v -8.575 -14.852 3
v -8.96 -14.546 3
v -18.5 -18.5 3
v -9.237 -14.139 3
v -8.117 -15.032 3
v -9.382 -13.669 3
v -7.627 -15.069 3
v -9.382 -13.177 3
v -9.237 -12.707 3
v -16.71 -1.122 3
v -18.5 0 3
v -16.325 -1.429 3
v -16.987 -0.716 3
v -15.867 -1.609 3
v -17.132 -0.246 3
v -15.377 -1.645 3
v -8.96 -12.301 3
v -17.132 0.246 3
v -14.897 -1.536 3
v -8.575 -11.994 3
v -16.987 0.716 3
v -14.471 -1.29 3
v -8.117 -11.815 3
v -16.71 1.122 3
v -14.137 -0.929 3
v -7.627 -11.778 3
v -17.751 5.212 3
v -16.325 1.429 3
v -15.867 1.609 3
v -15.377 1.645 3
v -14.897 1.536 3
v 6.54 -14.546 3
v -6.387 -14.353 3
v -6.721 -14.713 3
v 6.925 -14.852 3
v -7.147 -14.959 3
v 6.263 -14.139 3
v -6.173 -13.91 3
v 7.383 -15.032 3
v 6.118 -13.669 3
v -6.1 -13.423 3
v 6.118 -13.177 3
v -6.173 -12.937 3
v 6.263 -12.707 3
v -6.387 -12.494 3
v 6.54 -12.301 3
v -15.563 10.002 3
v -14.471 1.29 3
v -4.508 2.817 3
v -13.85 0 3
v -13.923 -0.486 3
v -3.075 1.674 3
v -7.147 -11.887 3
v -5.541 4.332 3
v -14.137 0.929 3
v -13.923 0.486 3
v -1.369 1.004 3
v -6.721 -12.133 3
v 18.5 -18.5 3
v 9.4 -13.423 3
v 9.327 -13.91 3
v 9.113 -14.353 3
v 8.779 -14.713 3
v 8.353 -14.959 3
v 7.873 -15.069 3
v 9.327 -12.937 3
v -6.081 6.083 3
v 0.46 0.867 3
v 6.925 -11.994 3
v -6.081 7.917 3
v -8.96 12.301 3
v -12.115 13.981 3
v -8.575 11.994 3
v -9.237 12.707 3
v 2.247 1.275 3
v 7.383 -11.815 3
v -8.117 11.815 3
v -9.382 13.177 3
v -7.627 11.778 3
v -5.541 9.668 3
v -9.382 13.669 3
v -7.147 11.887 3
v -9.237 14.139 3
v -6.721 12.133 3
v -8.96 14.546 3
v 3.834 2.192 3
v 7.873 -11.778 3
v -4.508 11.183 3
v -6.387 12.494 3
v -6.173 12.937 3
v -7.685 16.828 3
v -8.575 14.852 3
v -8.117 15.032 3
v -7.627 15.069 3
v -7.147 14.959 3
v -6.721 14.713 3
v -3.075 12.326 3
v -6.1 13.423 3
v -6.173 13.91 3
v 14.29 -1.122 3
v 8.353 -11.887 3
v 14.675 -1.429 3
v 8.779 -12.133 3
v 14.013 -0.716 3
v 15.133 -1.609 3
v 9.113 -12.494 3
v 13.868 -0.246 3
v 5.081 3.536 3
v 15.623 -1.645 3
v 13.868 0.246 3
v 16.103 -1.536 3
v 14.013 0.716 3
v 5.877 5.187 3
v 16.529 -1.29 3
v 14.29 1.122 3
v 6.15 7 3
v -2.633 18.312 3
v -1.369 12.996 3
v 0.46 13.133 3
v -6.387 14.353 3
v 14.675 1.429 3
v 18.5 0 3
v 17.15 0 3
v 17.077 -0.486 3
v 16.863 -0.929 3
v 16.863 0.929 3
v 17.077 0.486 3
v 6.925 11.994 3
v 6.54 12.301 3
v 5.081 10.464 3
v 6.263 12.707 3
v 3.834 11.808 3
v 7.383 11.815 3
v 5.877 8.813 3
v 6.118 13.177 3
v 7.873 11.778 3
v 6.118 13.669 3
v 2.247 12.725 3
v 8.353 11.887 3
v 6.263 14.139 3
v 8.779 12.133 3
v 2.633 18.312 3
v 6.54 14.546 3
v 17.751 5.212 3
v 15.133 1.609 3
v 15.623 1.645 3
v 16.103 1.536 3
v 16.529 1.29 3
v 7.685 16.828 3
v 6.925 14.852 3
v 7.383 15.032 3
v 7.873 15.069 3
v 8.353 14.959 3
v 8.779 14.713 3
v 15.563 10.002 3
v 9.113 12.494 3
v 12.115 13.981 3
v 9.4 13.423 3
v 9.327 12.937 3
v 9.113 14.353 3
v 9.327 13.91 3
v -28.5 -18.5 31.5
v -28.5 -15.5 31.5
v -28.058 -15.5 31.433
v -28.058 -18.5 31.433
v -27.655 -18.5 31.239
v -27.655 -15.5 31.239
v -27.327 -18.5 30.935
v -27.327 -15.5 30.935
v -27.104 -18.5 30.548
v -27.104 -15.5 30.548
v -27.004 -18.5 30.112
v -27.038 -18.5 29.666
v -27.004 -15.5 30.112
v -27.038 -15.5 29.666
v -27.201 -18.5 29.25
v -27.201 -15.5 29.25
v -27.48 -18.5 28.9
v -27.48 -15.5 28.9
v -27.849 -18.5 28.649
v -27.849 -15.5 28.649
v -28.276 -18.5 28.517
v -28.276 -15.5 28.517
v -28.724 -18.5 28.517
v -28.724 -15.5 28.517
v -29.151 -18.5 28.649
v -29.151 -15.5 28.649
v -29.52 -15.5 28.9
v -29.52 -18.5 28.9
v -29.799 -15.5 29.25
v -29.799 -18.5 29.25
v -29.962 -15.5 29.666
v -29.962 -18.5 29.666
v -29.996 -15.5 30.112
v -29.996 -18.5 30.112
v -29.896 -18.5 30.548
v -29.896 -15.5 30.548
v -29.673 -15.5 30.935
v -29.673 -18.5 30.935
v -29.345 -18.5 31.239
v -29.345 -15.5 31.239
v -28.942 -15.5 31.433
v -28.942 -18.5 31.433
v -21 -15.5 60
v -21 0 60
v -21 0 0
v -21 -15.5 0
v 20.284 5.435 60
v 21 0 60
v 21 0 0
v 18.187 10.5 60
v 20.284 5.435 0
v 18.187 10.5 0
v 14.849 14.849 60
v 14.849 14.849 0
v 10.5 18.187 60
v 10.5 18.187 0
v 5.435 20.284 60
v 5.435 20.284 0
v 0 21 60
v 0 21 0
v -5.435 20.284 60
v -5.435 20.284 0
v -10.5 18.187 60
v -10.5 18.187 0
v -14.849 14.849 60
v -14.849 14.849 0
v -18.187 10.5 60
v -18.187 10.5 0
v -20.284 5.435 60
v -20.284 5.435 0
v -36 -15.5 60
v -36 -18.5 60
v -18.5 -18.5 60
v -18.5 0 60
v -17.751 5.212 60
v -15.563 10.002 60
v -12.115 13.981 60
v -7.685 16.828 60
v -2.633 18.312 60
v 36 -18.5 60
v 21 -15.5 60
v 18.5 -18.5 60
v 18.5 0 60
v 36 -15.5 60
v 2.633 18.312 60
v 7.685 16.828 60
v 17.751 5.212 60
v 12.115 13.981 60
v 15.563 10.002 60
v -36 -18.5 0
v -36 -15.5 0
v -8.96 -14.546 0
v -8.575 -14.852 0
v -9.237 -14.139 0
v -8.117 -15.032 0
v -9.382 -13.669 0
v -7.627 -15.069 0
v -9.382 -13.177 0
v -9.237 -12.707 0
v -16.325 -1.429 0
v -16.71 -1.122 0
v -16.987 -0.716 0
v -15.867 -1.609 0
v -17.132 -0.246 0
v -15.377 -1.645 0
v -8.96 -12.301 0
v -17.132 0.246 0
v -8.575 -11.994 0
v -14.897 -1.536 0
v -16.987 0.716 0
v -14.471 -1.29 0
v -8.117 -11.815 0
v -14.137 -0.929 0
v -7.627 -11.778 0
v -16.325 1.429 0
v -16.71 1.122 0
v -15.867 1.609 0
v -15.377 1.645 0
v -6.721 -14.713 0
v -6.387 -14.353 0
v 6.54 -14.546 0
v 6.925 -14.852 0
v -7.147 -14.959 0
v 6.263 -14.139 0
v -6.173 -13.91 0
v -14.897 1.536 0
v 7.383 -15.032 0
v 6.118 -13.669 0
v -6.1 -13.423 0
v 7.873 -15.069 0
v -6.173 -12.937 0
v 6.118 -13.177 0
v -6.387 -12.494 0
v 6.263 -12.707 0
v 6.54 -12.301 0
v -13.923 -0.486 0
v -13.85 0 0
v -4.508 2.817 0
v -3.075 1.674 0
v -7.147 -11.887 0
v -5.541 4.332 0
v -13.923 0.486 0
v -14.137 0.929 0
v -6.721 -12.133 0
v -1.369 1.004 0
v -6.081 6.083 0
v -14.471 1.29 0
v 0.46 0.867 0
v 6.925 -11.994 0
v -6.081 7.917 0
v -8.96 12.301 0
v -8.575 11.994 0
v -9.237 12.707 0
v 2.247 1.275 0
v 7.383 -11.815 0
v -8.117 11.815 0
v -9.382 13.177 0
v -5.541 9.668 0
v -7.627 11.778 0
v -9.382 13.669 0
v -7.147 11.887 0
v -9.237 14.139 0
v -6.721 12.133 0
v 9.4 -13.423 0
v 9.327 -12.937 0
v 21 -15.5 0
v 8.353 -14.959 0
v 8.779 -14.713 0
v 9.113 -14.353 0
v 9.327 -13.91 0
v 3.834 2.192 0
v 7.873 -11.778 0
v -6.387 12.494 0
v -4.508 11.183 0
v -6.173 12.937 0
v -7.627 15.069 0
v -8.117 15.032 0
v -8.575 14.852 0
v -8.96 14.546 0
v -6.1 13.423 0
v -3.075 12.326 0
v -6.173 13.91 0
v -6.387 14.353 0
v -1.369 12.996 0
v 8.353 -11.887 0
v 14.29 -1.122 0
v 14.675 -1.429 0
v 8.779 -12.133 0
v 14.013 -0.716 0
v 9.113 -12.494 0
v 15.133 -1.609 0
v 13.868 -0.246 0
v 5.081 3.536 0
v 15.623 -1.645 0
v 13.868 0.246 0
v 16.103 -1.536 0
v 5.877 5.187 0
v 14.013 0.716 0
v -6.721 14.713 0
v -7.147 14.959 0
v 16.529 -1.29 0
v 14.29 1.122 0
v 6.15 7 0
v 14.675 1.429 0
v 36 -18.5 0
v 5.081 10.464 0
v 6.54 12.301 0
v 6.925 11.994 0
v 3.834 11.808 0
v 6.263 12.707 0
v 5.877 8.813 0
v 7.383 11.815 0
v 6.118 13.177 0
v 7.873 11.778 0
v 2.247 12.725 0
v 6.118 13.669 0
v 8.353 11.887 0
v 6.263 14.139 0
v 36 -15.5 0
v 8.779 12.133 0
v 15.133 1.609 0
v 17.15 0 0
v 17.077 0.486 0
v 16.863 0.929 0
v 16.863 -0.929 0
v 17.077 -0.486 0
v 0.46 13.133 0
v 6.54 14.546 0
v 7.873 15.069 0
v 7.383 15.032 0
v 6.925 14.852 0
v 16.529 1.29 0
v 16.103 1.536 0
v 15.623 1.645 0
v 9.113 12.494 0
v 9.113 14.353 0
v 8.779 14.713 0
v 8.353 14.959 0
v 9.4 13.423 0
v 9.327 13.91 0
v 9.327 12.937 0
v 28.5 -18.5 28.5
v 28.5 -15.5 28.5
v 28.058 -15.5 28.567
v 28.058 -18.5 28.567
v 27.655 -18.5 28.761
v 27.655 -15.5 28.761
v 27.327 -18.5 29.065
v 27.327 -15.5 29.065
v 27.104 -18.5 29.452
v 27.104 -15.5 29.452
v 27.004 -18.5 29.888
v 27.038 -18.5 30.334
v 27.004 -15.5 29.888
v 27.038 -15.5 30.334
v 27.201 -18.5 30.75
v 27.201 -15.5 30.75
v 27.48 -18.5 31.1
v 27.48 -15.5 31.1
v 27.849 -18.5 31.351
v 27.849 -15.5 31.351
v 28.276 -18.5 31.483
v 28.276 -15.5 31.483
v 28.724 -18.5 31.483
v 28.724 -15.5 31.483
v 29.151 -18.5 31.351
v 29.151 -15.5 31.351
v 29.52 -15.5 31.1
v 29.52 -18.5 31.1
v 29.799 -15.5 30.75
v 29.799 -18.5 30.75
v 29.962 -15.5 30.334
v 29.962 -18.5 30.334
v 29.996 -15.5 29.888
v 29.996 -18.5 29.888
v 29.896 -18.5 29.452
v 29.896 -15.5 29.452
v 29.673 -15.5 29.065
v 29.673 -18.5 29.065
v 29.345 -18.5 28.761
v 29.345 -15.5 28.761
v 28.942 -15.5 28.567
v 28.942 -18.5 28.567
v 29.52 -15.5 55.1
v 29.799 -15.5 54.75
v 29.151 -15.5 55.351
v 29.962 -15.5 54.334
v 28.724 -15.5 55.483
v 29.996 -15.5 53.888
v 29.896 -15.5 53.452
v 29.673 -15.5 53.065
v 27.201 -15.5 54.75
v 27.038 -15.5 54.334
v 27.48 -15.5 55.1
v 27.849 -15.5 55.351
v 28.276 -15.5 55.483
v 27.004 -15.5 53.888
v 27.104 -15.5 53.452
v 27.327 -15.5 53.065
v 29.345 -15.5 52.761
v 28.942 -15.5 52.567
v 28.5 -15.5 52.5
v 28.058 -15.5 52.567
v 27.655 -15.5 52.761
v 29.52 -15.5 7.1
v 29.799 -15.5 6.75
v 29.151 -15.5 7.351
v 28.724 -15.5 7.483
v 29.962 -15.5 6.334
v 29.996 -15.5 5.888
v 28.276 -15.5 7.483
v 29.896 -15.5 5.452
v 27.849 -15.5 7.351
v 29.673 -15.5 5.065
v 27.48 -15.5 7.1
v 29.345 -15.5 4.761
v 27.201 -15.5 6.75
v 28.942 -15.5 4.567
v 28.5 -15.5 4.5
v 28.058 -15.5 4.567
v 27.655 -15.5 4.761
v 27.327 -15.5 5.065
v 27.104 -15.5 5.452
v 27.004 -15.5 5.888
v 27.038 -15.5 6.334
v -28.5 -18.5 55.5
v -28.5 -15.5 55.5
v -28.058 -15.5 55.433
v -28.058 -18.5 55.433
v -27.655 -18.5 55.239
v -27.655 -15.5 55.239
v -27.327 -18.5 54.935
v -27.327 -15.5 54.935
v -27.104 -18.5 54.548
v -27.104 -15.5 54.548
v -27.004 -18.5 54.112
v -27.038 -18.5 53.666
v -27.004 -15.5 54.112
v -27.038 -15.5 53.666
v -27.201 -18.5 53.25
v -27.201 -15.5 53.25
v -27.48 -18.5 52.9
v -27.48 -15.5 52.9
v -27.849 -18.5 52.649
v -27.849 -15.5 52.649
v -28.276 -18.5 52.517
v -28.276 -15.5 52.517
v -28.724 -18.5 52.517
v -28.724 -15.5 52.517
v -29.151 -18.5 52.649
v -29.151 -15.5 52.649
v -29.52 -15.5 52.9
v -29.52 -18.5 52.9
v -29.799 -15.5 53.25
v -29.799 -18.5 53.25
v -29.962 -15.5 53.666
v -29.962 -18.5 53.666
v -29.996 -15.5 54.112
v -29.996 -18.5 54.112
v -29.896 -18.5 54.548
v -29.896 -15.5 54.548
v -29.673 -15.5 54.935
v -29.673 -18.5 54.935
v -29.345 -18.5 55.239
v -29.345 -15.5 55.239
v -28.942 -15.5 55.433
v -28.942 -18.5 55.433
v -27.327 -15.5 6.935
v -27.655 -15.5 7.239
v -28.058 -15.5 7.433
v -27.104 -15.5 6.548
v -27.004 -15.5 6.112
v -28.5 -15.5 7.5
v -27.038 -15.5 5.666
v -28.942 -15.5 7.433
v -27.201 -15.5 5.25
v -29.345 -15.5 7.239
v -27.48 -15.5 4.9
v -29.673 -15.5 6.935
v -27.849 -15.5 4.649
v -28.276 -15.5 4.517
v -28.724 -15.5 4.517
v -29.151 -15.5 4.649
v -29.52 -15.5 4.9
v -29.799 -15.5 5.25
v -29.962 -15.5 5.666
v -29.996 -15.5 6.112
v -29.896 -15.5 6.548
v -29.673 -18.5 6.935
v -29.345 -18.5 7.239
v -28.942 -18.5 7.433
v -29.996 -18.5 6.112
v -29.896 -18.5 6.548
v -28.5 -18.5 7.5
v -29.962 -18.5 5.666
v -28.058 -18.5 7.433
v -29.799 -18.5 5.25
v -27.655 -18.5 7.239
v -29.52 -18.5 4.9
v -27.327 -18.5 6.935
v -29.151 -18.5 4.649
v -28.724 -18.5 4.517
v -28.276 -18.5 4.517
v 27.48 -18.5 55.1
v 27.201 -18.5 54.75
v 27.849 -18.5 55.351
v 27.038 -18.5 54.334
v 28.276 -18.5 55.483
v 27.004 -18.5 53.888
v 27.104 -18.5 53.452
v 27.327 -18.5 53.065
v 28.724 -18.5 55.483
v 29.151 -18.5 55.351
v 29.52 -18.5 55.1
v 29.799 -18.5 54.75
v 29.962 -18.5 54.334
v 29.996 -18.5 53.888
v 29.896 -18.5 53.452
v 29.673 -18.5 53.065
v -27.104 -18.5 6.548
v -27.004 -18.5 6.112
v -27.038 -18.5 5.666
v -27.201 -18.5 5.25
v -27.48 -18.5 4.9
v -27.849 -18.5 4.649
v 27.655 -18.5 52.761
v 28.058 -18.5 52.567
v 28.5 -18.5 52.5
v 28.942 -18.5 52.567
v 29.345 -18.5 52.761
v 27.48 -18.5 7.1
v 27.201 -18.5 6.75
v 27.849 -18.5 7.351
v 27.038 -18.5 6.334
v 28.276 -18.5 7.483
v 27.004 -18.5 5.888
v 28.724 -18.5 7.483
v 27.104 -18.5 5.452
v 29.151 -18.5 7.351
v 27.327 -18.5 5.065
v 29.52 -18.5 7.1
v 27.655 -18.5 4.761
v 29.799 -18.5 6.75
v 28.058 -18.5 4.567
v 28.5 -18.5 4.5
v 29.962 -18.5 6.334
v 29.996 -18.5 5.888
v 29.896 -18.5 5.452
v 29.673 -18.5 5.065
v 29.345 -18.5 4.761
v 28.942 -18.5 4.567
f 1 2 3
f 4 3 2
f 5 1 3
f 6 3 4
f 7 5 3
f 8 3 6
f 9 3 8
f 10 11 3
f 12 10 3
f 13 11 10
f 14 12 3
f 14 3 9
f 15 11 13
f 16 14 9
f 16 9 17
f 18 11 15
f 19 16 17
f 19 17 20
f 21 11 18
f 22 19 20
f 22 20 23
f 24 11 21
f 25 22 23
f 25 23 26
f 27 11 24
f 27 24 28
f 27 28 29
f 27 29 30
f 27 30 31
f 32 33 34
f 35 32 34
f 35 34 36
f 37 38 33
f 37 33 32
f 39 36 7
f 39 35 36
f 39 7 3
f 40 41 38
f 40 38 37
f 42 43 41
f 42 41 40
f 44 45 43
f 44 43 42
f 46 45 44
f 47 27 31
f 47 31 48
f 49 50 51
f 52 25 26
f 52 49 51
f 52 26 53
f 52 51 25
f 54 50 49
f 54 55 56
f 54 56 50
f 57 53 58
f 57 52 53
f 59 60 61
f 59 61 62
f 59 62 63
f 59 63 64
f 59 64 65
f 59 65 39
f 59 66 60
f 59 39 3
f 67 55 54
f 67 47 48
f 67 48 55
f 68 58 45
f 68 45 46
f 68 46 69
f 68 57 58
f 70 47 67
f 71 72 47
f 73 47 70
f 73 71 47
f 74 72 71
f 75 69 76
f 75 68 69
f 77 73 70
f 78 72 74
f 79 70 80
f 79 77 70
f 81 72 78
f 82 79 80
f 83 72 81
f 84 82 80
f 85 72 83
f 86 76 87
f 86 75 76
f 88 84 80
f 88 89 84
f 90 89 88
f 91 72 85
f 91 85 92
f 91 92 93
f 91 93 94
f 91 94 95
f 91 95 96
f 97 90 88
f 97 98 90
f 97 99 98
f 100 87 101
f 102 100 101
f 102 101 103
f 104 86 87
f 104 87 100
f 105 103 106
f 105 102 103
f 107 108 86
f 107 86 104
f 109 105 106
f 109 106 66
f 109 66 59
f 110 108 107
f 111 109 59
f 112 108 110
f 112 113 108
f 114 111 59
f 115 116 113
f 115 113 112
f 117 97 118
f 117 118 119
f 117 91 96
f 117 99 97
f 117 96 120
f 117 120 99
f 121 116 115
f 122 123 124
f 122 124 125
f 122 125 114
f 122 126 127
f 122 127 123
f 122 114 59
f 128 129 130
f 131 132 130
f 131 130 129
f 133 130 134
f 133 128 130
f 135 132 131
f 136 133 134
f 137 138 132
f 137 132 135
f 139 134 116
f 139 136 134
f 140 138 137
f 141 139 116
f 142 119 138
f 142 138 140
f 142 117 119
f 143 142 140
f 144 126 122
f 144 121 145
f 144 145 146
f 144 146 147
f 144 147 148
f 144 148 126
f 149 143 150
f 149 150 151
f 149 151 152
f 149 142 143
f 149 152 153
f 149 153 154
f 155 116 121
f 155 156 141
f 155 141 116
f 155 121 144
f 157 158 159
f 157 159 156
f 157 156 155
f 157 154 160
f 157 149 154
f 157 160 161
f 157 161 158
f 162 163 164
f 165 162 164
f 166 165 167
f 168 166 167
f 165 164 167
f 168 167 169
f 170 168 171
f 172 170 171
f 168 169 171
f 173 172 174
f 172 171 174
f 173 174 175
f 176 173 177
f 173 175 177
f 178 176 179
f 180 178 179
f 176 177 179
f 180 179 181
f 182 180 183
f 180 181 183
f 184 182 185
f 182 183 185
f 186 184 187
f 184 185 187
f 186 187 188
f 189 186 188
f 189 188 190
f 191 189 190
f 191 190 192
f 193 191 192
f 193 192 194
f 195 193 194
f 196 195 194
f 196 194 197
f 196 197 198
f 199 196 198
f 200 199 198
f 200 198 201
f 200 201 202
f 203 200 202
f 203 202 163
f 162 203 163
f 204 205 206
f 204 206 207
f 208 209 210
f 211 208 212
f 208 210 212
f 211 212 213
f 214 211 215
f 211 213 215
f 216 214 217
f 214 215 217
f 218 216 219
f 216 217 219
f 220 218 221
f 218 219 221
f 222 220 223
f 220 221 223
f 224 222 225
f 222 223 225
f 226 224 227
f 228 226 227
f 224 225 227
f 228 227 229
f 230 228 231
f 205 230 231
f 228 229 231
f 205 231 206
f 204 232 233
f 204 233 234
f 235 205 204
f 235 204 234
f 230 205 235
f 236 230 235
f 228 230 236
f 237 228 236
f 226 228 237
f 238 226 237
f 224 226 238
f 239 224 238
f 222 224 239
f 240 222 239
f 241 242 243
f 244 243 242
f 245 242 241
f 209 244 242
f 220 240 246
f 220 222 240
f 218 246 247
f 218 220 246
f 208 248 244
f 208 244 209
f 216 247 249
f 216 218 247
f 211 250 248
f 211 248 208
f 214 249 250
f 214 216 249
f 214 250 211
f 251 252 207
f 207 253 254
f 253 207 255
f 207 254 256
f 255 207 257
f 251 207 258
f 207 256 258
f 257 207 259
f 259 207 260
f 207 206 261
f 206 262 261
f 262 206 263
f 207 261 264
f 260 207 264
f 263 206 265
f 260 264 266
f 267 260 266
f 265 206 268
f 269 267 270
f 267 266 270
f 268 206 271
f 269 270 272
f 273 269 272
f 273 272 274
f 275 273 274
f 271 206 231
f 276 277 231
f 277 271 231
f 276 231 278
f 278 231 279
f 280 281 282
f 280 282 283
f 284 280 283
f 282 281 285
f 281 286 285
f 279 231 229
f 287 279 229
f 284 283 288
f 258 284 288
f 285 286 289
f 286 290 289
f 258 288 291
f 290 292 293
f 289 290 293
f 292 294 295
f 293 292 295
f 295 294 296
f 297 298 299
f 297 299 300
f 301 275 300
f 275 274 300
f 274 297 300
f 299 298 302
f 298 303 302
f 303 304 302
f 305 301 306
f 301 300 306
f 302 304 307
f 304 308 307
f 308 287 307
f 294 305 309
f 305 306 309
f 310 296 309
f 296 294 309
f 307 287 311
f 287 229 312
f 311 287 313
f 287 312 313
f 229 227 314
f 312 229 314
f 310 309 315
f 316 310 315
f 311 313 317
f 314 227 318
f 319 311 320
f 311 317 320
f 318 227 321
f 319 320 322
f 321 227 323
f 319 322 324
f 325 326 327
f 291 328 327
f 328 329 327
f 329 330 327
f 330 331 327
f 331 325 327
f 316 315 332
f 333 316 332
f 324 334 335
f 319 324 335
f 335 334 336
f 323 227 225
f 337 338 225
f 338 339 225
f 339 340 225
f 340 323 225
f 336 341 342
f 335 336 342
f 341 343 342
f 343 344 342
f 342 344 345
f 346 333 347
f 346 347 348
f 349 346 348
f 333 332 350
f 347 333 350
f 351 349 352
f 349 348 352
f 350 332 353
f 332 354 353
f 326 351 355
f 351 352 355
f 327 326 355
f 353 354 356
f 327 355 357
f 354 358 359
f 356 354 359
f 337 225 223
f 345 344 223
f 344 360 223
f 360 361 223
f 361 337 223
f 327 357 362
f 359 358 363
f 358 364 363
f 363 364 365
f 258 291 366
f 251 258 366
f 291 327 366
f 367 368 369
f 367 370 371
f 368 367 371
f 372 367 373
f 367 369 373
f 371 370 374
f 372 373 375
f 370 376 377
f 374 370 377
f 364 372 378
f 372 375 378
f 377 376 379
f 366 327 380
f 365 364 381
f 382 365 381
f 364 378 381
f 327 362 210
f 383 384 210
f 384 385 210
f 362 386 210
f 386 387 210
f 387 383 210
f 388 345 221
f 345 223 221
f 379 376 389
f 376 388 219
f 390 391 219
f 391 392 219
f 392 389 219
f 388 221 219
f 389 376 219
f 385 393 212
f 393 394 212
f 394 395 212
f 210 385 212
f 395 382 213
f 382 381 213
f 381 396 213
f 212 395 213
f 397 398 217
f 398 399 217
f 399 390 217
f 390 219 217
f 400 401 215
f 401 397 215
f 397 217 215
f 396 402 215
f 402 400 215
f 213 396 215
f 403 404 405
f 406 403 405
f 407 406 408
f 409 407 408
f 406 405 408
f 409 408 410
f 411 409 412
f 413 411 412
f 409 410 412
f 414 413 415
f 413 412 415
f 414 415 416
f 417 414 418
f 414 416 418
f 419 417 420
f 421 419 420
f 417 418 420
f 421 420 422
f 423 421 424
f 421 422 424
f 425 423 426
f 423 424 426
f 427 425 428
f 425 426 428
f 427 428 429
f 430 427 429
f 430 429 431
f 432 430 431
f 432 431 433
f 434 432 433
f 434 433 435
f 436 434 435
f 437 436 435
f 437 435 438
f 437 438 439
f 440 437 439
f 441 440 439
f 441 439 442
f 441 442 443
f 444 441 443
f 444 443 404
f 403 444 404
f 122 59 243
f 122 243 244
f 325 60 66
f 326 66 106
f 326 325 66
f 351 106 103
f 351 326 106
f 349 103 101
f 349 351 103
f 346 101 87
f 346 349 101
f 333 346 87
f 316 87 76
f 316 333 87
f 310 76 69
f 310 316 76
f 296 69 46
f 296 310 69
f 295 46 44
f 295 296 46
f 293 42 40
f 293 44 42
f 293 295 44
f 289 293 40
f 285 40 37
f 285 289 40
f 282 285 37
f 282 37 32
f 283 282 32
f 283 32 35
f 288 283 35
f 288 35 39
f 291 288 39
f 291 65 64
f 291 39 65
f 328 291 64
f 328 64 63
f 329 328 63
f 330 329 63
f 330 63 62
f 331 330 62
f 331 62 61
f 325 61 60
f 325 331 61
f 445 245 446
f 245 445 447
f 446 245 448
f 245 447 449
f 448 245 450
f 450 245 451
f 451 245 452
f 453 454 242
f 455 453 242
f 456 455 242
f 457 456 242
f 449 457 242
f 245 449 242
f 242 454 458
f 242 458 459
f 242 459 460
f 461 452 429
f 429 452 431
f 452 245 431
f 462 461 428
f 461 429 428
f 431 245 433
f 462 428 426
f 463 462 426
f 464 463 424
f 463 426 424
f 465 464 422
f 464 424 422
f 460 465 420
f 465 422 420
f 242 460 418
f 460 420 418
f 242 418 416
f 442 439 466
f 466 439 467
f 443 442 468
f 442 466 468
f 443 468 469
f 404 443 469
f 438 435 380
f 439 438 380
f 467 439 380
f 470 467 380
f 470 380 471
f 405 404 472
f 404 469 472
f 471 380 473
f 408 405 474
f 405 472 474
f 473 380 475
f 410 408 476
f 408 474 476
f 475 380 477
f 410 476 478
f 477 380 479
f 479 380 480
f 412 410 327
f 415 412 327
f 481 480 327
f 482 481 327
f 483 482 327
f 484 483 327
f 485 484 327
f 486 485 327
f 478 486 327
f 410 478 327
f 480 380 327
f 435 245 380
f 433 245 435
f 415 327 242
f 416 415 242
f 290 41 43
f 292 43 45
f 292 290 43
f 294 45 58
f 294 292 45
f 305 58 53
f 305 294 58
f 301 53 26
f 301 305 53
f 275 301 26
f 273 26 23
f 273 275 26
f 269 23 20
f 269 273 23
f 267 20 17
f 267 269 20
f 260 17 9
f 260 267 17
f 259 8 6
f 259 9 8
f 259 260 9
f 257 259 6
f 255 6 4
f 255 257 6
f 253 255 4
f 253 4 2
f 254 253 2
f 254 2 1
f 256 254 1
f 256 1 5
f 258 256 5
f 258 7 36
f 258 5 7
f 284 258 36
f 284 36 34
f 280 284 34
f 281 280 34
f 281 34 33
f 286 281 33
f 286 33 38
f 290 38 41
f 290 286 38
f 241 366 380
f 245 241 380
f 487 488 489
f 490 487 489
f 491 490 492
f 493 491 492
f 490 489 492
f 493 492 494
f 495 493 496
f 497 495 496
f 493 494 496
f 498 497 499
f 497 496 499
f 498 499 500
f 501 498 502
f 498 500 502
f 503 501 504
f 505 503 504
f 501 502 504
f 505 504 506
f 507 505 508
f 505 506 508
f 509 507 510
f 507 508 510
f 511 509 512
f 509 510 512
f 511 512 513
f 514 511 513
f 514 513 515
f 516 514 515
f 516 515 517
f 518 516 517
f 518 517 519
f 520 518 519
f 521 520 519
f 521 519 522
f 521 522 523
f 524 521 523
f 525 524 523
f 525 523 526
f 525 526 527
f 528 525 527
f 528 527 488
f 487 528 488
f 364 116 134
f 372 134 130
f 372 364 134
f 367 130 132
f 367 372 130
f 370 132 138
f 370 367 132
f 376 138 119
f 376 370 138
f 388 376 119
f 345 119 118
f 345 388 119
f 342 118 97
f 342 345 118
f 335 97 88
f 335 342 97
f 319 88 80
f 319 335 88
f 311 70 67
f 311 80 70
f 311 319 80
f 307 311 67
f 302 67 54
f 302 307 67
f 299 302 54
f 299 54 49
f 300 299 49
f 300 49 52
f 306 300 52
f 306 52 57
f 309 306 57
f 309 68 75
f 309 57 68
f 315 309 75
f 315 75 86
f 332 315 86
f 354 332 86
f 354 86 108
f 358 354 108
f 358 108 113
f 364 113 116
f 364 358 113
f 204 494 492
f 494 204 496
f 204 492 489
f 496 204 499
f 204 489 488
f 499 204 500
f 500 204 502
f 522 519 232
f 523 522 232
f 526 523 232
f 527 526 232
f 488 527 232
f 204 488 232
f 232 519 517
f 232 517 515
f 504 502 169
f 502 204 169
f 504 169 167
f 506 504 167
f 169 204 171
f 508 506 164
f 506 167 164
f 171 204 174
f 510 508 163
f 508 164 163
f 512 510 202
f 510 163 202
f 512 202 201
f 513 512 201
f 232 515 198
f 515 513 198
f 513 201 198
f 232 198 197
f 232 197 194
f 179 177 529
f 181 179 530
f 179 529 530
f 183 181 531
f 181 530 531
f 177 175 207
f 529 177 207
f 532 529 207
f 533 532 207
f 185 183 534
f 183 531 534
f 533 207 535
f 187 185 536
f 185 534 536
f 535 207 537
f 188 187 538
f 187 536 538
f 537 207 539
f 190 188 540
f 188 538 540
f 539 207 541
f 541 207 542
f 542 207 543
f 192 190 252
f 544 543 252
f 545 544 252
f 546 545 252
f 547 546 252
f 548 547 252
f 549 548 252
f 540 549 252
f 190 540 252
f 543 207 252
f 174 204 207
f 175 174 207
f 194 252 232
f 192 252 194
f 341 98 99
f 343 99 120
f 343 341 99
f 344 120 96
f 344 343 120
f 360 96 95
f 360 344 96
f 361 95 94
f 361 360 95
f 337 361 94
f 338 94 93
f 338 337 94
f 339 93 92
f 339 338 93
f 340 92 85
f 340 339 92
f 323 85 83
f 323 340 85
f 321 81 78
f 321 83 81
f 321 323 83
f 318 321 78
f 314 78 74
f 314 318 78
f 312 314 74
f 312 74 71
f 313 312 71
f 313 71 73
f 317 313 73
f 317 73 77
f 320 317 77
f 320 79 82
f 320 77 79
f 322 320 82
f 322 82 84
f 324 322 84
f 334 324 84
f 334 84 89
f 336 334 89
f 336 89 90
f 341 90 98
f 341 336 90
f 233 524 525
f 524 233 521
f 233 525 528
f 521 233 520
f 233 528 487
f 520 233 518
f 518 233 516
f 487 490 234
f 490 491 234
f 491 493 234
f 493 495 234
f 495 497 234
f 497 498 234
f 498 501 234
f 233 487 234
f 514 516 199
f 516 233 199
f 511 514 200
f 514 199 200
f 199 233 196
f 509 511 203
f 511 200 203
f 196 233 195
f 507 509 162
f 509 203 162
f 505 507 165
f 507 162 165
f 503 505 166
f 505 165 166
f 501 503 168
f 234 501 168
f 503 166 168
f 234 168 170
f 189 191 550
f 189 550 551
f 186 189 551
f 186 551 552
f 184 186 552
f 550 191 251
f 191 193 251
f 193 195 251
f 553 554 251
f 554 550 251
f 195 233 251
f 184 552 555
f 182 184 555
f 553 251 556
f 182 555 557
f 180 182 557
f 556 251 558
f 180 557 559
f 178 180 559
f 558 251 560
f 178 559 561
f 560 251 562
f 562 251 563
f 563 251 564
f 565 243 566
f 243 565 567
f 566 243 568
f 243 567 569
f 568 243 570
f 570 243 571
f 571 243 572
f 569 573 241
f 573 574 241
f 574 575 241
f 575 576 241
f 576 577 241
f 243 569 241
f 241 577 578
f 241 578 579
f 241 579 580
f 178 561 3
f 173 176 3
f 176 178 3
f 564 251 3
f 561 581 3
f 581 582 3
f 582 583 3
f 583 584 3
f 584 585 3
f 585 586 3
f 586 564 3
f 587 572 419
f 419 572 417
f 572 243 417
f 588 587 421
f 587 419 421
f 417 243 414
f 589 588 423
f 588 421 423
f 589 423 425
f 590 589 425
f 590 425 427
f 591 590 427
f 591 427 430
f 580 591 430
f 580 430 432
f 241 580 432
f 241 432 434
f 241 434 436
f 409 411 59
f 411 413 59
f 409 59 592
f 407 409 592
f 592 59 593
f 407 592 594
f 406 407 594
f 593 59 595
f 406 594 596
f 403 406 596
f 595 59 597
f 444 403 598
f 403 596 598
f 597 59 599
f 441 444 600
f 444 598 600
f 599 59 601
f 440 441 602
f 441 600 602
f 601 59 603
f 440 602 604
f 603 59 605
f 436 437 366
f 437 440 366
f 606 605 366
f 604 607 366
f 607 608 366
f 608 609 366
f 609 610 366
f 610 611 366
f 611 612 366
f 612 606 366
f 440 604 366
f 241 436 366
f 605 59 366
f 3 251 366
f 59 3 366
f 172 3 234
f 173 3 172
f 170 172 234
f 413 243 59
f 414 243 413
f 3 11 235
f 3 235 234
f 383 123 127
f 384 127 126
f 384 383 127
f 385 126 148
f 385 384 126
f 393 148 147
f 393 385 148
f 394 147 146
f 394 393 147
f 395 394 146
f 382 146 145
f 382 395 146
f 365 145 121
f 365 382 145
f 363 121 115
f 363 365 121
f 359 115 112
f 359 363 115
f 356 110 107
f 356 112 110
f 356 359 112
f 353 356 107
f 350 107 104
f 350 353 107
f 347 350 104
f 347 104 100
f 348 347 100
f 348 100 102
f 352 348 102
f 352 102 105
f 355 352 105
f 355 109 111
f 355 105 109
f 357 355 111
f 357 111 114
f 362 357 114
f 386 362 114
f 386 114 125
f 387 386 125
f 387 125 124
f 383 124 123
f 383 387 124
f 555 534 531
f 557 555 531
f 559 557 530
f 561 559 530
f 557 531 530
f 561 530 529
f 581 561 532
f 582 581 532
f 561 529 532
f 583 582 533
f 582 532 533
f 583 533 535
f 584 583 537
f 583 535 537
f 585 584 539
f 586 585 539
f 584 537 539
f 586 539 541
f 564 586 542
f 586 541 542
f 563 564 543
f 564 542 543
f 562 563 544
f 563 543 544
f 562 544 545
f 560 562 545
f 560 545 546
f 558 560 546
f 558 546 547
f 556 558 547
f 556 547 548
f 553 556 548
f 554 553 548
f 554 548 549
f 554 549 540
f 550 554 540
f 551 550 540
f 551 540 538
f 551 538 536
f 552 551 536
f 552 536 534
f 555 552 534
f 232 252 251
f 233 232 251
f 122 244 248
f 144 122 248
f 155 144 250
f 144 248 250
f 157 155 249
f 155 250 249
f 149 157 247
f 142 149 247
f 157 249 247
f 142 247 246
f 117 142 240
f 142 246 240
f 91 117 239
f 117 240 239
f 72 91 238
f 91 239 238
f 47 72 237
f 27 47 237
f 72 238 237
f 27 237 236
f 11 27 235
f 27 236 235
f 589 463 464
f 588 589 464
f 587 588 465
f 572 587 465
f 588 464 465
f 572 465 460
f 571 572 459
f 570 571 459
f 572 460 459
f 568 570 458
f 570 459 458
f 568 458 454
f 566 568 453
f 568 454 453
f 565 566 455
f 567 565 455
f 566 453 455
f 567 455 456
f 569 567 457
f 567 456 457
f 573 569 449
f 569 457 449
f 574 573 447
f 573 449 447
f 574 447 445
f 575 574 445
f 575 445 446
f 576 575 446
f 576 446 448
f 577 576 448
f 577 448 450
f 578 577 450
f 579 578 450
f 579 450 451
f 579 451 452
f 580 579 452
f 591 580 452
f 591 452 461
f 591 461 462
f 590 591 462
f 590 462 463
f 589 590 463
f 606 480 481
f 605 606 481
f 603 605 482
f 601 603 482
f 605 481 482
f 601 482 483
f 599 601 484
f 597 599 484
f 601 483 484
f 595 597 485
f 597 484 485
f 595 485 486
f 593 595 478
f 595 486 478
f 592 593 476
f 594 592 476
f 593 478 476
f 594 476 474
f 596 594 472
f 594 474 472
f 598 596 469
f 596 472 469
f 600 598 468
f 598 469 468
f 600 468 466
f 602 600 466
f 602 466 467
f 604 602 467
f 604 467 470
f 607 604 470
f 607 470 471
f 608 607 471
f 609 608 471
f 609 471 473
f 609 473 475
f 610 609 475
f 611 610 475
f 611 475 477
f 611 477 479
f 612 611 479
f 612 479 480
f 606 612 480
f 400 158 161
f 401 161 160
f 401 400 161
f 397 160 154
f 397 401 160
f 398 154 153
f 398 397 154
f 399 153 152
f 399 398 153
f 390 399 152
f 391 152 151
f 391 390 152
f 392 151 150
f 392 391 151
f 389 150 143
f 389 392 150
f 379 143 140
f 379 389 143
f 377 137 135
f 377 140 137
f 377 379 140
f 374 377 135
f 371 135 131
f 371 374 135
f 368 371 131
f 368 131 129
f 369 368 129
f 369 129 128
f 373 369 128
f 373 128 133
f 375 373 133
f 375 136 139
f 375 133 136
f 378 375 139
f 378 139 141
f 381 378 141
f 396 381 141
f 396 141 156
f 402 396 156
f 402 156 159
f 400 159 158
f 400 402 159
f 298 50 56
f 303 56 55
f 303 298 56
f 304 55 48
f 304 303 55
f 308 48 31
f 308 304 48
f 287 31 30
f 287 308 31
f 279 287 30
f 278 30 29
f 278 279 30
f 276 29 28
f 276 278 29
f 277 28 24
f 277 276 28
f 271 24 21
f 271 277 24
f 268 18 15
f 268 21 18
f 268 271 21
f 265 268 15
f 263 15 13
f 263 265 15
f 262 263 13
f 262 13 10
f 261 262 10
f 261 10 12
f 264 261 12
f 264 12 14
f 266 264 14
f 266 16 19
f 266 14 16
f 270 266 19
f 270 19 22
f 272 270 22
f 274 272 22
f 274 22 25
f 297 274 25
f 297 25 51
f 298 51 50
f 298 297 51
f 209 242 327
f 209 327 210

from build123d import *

# Parameters (mm, degrees)
SKETCH1_R           = 1.65
SKETCH1_R_2         = 6.15
BOSS_EXTRUDE1_DEPTH = 60
CUT_EXTRUDE1_DEPTH  = 57
SKETCH3_R           = 1.5
CUT_EXTRUDE2_DEPTH  = 79.919262541


with BuildPart() as part:
    # Sketch1 → Boss-Extrude1 (new body)
    with BuildSketch(Plane.XY):
        with BuildLine():
            Line((-21, 0), (-21, -15.5))
            Line((-21, -15.5), (-36, -15.5))
            Line((-36, -15.5), (-36, -18.5))
            Line((-36, -18.5), (36, -18.5))
            Line((36, -18.5), (36, -15.5))
            Line((36, -15.5), (21, -15.5))
            Line((21, -15.5), (21, 0))
            ThreePointArc((21, 0), (0, 21), (-21, 0))
        make_face()
        with Locations((-15.5, 0)):
            Circle(SKETCH1_R, mode=Mode.SUBTRACT)
        with Locations((-7.75, 13.423393759)):
            Circle(SKETCH1_R, mode=Mode.SUBTRACT)
        with Locations((7.75, 13.423393759)):
            Circle(SKETCH1_R, mode=Mode.SUBTRACT)
        with Locations((15.5, 0)):
            Circle(SKETCH1_R, mode=Mode.SUBTRACT)
        with Locations((7.75, -13.423393759)):
            Circle(SKETCH1_R, mode=Mode.SUBTRACT)
        with Locations((-7.75, -13.423393759)):
            Circle(SKETCH1_R, mode=Mode.SUBTRACT)
        with Locations((0, 7)):
            Circle(SKETCH1_R_2, mode=Mode.SUBTRACT)
    extrude(amount=BOSS_EXTRUDE1_DEPTH)

    # Sketch2 → Cut-Extrude1 (cut)
    with BuildSketch(Plane.XY.offset(60)):
        with BuildLine():
            Line((-18.5, 0), (-18.5, -18.5))
            Line((-18.5, -18.5), (18.5, -18.5))
            Line((18.5, -18.5), (18.5, 0))
            ThreePointArc((18.5, 0), (0, 18.5), (-18.5, 0))
        make_face()
    extrude(amount=-CUT_EXTRUDE1_DEPTH, mode=Mode.SUBTRACT)

    # Sketch3 → Cut-Extrude2 (cut, through all)
    with BuildSketch(Plane(origin=(0, -15.5, 0), x_dir=(1, 0, 0), z_dir=(0, 1, 0))):
        with Locations(Location((-28.5, -30, 0), (0, 0, 270))):
            Circle(SKETCH3_R)
        with Locations(Location((-28.5, -6, 0), (0, 0, 270))):
            Circle(SKETCH3_R)
        with Locations(Location((-28.5, -54, 0), (0, 0, 270))):
            Circle(SKETCH3_R)
        with Locations(Location((28.5, -54, 0), (0, 0, 90))):
            Circle(SKETCH3_R)
        with Locations(Location((28.5, -6, 0), (0, 0, 90))):
            Circle(SKETCH3_R)
        with Locations(Location((28.5, -30, 0), (0, 0, 90))):
            Circle(SKETCH3_R)
    extrude(amount=-CUT_EXTRUDE2_DEPTH, mode=Mode.SUBTRACT)


solid = part.part
